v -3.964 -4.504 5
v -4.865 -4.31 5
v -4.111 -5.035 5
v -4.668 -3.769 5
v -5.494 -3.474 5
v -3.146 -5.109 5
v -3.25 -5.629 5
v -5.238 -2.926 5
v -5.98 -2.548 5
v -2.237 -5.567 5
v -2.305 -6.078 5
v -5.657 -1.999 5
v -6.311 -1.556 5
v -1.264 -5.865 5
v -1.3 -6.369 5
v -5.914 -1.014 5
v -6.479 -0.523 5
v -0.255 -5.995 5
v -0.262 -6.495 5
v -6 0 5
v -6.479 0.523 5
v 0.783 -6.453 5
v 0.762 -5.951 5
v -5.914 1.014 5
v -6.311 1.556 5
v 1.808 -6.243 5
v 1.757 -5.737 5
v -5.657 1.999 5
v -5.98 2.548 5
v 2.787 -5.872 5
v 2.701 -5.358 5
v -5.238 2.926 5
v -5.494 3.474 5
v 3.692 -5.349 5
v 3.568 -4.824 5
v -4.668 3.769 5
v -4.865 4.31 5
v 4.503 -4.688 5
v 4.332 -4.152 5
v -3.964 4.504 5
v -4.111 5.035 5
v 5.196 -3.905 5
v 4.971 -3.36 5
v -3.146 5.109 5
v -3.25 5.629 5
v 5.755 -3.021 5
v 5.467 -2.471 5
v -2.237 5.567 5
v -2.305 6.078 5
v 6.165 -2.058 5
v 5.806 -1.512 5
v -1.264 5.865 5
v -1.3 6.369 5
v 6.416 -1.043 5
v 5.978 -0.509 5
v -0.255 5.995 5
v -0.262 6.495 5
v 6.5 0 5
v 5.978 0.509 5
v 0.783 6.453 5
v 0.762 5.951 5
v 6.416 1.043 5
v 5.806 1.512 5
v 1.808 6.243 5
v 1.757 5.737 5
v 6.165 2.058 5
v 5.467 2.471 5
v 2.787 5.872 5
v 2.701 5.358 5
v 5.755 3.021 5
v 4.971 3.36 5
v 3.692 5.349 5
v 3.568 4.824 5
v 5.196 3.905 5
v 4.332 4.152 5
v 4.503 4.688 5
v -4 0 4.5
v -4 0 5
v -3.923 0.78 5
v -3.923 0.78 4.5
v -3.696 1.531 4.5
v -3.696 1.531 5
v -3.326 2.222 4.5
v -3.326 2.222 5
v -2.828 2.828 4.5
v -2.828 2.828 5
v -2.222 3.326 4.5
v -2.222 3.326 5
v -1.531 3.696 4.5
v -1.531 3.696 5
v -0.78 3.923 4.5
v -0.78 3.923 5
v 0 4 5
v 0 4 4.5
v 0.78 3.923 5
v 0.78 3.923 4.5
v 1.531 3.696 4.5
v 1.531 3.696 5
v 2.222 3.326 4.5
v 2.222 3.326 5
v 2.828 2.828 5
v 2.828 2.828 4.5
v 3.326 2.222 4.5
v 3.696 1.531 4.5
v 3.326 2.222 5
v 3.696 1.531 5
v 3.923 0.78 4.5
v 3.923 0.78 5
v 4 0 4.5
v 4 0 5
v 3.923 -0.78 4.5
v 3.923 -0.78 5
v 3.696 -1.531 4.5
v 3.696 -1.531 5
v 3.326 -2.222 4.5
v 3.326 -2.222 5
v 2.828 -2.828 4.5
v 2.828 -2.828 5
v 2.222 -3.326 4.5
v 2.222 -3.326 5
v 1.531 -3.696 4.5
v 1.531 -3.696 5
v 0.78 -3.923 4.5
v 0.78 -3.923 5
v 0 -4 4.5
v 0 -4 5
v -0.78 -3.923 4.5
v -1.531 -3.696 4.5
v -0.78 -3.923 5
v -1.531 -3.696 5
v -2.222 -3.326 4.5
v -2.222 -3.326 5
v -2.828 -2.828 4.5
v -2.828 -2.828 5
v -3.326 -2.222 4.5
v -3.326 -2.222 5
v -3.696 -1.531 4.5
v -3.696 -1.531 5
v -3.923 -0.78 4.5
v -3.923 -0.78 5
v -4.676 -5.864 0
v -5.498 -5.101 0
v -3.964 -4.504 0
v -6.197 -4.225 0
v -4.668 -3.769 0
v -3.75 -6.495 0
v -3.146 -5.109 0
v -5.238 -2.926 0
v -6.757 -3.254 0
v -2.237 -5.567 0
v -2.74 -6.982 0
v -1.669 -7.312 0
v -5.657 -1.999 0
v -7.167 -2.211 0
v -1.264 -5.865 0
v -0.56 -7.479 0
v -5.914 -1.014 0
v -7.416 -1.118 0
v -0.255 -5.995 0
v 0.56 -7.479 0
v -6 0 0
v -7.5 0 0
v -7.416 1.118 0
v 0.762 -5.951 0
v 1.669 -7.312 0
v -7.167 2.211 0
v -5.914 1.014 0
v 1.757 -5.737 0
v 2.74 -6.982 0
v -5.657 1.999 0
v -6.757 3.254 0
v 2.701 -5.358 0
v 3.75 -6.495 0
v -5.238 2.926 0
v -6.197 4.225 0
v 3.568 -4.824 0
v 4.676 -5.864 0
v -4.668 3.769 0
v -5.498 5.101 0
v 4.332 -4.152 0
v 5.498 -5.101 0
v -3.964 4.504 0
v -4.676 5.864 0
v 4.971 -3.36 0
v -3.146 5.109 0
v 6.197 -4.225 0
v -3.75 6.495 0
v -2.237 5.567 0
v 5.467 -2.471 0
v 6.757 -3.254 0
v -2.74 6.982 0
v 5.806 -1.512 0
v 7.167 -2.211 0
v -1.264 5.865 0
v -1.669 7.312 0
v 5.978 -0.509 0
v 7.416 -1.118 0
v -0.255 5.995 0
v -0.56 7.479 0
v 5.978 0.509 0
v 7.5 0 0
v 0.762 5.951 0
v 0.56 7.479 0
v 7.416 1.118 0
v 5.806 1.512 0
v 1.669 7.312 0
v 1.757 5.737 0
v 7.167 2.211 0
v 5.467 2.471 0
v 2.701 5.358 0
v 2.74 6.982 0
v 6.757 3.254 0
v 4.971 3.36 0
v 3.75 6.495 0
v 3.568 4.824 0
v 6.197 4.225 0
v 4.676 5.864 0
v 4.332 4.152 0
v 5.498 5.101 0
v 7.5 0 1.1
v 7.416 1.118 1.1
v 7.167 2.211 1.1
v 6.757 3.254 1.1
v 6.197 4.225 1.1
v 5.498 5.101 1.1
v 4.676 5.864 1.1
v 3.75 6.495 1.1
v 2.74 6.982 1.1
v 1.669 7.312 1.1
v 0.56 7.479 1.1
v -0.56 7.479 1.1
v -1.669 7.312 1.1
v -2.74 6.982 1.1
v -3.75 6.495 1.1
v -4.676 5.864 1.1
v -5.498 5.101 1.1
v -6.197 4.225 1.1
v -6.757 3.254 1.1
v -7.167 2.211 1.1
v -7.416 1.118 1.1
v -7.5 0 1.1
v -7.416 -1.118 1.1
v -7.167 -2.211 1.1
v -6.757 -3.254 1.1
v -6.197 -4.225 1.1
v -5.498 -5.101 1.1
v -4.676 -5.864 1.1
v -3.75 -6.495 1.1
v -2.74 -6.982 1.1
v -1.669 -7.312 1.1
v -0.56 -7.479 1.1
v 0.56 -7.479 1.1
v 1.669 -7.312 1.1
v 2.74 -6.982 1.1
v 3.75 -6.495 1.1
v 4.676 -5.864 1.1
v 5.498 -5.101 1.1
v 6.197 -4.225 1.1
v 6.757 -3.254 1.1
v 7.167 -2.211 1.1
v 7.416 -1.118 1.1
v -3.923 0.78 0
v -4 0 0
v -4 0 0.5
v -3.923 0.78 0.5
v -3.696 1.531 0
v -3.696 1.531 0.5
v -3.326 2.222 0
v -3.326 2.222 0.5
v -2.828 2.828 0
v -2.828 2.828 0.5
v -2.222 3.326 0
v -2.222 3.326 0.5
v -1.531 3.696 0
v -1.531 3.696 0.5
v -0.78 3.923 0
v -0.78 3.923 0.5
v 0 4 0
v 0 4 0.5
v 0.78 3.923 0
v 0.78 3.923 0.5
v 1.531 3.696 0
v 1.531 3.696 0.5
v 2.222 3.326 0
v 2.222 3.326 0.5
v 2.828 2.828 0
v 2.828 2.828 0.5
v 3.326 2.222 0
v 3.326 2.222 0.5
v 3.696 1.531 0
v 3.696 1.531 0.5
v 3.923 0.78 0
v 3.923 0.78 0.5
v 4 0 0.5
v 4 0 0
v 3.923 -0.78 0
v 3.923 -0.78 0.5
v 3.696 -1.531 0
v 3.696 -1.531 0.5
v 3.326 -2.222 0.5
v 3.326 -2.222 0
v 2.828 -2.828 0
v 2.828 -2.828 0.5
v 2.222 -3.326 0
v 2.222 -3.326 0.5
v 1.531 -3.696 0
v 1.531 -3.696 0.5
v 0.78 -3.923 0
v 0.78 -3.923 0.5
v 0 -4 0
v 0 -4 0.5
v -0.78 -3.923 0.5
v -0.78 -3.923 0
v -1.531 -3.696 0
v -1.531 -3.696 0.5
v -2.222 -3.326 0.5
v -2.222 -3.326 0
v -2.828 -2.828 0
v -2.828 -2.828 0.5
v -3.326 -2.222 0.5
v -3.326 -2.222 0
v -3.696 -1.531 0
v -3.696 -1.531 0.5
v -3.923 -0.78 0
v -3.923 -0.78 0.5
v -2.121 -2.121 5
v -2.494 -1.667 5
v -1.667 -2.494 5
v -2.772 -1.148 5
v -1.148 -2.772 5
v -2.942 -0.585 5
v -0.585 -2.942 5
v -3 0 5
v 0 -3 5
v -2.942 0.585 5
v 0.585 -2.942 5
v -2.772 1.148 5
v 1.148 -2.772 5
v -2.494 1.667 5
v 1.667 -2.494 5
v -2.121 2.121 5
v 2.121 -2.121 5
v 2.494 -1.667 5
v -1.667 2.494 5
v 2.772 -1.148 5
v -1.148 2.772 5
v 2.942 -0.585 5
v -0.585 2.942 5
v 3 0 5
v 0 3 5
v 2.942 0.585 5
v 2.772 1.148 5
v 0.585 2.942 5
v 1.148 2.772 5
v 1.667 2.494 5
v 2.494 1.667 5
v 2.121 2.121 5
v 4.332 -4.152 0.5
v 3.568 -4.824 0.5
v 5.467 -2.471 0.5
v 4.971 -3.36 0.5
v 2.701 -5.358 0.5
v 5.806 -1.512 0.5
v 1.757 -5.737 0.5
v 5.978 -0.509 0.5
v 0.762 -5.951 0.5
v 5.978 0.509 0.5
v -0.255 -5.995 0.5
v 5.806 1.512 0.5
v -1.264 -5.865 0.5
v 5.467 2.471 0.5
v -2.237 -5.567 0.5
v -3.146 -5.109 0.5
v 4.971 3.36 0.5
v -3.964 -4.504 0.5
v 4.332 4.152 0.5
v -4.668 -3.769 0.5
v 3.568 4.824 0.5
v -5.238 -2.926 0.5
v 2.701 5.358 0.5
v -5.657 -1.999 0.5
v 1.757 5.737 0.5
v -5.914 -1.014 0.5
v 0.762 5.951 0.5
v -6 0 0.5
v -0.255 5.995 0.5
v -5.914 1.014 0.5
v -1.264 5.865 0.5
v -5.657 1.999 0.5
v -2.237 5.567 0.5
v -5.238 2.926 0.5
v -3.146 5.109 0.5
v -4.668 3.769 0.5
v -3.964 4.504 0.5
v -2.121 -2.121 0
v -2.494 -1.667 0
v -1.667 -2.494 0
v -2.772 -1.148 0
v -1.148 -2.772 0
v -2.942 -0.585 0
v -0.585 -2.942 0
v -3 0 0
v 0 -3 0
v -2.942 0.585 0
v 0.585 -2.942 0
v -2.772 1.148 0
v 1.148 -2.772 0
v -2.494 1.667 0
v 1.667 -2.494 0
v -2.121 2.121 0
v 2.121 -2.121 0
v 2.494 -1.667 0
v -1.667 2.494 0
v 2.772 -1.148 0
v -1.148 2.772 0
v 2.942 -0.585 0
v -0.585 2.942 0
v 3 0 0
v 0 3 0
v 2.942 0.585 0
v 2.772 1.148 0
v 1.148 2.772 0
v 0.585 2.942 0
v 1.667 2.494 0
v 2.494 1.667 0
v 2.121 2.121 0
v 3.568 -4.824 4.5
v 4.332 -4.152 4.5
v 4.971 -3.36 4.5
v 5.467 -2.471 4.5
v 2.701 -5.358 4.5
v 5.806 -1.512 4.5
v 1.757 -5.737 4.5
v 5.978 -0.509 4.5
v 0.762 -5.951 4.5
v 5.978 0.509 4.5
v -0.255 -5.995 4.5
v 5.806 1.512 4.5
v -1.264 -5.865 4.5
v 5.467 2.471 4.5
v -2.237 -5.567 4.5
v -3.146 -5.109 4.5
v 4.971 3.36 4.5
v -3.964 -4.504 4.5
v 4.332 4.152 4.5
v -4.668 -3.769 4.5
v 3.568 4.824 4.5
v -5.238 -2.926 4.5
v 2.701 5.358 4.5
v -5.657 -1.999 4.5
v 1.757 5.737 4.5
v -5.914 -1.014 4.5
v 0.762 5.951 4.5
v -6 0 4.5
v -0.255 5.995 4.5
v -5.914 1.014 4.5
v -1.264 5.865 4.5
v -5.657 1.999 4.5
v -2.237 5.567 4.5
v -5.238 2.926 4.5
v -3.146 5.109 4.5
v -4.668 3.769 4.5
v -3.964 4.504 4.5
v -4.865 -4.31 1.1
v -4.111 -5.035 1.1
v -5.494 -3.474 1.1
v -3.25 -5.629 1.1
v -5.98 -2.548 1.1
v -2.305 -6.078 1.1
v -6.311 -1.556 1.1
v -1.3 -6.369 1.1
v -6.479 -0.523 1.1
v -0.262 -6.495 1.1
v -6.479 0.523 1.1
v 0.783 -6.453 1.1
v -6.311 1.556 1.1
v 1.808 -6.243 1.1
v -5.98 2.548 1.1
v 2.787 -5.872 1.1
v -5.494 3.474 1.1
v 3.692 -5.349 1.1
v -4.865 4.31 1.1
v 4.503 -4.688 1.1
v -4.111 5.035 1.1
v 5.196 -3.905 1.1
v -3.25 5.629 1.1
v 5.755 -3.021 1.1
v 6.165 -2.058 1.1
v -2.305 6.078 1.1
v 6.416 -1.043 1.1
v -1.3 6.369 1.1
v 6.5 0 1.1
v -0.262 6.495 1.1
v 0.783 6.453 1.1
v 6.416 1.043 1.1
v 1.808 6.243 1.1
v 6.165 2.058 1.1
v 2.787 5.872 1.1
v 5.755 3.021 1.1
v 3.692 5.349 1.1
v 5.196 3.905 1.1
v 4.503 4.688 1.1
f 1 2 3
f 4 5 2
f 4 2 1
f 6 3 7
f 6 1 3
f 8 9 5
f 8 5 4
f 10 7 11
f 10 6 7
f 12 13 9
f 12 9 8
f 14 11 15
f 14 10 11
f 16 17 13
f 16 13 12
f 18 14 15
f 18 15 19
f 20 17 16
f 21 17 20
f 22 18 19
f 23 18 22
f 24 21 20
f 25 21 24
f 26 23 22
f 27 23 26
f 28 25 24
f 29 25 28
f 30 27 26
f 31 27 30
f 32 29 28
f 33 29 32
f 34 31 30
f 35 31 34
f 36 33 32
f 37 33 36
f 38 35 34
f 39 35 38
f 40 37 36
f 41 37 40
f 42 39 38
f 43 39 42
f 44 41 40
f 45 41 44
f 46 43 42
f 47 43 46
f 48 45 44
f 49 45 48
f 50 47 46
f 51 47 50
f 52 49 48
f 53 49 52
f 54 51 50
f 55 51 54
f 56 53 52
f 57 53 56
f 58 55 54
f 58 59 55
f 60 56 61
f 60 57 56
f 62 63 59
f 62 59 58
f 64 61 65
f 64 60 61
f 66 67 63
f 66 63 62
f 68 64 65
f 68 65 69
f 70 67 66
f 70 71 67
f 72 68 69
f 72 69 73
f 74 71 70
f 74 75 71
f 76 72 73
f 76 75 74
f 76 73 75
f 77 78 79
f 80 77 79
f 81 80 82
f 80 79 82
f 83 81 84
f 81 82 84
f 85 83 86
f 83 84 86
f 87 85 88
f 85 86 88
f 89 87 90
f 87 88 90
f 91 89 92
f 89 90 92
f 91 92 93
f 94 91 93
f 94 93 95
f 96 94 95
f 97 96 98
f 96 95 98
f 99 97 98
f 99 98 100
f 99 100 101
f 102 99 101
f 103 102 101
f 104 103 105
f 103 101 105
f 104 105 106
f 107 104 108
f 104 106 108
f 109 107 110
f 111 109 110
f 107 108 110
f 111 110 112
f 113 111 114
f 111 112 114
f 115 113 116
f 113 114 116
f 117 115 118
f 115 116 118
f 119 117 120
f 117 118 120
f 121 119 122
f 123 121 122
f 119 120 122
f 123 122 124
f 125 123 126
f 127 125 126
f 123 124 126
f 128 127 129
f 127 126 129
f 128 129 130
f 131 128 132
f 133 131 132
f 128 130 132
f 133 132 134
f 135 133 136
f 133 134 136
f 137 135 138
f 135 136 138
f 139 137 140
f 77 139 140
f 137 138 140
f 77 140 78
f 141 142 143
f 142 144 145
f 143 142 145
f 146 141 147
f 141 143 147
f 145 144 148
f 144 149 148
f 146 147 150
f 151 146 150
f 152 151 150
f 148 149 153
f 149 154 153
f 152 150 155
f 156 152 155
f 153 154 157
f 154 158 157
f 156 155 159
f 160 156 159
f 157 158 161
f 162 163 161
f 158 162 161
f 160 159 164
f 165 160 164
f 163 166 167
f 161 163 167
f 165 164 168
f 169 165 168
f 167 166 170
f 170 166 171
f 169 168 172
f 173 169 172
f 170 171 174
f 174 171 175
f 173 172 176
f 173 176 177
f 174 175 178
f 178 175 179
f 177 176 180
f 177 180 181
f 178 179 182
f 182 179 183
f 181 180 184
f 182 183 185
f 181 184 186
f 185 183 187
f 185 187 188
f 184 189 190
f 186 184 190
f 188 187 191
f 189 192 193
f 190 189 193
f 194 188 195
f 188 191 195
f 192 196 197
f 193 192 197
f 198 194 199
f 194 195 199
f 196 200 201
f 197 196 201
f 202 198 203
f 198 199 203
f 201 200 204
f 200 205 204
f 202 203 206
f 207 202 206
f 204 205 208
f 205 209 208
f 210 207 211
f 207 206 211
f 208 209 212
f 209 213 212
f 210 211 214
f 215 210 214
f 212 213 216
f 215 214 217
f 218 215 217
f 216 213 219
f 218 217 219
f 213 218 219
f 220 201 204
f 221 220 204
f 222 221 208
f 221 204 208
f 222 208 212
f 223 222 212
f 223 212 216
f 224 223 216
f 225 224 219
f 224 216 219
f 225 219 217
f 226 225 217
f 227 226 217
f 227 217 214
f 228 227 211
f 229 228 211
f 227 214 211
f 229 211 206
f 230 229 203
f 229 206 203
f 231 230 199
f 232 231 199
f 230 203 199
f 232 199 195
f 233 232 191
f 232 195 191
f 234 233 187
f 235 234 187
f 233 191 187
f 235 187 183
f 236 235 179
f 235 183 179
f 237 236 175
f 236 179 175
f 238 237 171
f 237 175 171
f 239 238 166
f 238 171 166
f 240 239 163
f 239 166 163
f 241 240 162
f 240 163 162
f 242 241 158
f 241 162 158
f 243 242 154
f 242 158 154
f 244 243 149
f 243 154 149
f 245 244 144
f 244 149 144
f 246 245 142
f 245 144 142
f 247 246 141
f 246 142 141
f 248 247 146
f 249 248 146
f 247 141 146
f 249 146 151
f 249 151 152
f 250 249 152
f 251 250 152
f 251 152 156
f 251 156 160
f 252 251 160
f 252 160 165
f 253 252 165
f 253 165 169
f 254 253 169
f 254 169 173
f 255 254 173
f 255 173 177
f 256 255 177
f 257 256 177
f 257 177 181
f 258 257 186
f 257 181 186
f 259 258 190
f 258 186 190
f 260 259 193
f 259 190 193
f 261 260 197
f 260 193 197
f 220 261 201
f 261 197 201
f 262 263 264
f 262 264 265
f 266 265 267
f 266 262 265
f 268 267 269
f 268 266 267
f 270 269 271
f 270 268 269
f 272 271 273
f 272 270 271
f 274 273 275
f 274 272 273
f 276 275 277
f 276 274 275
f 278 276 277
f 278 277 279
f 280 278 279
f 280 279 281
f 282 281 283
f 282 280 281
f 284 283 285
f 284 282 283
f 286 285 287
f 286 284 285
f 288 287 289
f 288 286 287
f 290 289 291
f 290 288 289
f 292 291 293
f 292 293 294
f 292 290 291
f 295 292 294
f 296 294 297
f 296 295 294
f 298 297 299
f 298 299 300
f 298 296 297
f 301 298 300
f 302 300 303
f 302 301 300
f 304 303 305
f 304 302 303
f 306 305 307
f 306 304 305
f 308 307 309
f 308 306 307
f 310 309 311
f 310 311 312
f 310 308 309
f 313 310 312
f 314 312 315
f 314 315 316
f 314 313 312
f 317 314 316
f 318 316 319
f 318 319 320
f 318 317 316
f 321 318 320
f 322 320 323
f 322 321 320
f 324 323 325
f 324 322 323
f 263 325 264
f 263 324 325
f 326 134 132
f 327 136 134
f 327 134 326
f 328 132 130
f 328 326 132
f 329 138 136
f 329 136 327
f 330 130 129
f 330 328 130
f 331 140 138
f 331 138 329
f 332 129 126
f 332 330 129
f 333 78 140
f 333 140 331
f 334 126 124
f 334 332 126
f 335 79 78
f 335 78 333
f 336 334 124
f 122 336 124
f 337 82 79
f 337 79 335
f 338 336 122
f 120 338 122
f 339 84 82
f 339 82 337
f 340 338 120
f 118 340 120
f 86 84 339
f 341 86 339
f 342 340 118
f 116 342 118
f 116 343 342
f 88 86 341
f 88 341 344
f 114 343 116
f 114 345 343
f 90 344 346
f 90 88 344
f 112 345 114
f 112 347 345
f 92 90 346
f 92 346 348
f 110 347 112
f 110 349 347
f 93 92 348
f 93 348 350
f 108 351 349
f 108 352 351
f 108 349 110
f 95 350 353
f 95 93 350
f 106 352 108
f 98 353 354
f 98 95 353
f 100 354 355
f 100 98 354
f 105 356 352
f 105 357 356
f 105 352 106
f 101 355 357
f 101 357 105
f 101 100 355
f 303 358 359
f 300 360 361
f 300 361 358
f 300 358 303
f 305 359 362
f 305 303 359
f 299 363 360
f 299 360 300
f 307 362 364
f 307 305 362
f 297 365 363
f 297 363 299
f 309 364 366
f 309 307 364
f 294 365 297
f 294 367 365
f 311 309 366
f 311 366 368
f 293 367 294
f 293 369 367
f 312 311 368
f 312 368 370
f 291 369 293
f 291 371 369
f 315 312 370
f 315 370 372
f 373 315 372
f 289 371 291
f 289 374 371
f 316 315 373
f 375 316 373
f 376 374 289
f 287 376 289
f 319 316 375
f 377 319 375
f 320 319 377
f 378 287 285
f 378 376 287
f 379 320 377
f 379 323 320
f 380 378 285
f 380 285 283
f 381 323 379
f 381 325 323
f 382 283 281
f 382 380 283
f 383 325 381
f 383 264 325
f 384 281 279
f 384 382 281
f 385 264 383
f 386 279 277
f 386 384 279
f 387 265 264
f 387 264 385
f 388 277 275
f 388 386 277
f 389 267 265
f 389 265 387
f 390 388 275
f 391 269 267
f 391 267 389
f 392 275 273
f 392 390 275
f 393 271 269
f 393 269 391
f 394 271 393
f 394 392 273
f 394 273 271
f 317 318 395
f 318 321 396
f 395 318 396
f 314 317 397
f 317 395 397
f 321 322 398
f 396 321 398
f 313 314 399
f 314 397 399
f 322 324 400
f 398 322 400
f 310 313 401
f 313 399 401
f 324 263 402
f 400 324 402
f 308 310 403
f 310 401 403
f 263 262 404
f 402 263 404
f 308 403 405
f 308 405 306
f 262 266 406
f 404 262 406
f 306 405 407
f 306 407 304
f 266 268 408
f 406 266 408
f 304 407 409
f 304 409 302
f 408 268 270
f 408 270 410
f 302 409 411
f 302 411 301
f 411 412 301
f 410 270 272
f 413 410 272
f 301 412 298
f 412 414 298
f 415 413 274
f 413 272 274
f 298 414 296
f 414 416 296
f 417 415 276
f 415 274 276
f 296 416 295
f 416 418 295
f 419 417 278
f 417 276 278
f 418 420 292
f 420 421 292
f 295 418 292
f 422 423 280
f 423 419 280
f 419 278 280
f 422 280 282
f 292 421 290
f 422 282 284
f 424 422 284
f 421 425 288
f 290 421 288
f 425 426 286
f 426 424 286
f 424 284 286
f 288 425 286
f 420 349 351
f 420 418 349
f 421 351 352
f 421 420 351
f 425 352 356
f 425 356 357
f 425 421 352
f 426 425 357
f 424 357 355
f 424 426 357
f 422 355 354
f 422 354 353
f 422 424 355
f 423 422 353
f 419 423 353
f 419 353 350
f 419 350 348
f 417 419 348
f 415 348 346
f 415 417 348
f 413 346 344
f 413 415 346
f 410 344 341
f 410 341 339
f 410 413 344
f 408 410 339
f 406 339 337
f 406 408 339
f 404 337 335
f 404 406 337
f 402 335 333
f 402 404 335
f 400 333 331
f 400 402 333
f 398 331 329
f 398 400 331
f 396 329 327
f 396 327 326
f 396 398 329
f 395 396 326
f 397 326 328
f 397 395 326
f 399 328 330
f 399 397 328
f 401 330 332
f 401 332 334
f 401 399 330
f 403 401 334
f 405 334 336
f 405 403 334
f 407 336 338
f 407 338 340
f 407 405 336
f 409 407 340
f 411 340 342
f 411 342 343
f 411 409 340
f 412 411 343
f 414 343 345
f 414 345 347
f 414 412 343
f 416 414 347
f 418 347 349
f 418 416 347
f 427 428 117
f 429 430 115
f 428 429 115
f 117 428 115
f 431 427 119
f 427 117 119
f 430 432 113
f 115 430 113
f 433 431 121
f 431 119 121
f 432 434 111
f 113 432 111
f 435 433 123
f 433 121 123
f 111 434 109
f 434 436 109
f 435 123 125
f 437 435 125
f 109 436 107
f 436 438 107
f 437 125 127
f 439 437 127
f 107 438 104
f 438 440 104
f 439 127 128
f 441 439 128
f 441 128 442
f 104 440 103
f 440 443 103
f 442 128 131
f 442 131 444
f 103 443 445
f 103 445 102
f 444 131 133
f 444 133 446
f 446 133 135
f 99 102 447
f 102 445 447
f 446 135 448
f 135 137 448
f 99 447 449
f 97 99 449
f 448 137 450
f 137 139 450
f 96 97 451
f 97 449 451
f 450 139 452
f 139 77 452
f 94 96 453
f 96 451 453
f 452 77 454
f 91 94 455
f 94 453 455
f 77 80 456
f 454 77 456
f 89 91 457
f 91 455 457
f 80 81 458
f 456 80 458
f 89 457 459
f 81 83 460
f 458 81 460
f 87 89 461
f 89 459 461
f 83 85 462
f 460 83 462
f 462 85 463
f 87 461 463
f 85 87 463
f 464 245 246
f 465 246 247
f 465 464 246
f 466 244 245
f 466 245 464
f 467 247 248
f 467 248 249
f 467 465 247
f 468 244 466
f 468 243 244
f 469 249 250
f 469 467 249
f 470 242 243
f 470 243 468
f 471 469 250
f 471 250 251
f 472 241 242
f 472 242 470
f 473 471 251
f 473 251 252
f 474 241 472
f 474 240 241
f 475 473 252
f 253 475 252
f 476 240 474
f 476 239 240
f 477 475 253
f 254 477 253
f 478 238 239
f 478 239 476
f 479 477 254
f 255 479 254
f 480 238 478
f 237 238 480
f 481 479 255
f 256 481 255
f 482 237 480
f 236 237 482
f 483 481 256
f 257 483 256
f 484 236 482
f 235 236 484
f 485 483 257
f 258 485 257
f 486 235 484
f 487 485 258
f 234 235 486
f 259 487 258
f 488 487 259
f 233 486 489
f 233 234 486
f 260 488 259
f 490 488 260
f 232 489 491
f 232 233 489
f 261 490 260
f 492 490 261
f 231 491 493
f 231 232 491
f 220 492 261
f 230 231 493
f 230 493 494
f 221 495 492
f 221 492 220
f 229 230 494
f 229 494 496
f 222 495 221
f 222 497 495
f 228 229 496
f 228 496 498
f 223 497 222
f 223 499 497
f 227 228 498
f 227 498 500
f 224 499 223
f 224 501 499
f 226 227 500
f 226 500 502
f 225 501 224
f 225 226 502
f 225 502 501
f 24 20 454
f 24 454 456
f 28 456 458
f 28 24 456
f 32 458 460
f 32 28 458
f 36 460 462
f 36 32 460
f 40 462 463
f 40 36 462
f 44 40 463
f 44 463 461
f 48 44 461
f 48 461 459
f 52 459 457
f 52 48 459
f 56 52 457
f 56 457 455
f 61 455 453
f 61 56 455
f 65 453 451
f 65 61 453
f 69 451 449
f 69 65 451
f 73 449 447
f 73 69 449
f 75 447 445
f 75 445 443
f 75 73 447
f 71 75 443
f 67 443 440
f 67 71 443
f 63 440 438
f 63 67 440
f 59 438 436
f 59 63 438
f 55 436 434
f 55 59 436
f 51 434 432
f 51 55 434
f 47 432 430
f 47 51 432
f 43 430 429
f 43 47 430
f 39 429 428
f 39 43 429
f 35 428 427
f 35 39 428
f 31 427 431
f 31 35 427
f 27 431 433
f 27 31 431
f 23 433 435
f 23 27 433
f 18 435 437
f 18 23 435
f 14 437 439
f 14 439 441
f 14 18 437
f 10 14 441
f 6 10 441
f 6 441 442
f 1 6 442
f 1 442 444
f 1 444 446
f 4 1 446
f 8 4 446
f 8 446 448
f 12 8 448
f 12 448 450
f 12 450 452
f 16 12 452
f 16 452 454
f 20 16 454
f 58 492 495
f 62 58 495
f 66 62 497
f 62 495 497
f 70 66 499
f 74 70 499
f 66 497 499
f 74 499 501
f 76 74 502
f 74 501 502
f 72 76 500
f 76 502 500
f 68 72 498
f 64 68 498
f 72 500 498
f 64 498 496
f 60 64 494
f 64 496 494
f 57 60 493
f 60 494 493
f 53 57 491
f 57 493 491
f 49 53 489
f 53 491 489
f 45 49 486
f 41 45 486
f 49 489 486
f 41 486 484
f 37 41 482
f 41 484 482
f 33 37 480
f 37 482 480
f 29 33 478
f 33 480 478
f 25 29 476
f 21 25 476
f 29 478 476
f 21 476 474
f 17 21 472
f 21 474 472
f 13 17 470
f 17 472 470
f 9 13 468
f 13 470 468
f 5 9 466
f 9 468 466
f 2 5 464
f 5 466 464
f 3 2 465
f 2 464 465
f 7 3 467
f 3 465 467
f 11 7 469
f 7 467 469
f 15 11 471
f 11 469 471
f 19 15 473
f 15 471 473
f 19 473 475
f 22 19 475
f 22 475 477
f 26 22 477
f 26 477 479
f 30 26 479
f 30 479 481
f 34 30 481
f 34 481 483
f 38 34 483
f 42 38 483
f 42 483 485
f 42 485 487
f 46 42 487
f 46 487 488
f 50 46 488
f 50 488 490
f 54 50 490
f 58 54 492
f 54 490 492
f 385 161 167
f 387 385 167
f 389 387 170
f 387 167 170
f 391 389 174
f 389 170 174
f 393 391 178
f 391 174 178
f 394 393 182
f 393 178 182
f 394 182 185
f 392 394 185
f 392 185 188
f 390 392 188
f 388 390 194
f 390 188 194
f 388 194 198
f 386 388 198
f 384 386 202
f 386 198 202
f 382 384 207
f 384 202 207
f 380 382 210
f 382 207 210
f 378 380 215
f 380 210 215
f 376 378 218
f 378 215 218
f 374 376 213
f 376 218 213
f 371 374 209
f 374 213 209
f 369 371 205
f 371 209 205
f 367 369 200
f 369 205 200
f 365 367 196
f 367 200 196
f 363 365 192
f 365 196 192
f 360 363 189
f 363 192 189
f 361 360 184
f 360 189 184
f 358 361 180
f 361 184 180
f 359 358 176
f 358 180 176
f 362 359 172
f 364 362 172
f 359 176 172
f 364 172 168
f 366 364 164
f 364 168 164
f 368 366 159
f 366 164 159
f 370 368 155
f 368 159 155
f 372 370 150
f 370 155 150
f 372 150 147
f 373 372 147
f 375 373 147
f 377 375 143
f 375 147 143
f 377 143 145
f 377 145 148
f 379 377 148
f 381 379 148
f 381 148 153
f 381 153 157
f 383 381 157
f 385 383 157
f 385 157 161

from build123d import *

# Parameters (mm, degrees)
SKETCH1_R           = 7.5
SKETCH1_R_2         = 3
BOSS_EXTRUDE1_DEPTH = 1.1
SKETCH2_R           = 6.5
SKETCH2_R_2         = 3
BOSS_EXTRUDE2_DEPTH = 3.9
SKETCH3_R           = 6
SKETCH3_R_2         = 4
CUT_EXTRUDE1_DEPTH  = 0.5


with BuildPart() as part:
    # Sketch1 → Boss-Extrude1 (new body)
    with BuildSketch(Plane.XY):
        Circle(SKETCH1_R)
        Circle(SKETCH1_R_2, mode=Mode.SUBTRACT)
    extrude(amount=BOSS_EXTRUDE1_DEPTH)

    # Sketch2 → Boss-Extrude2 (add)
    with BuildSketch(Plane.XY.offset(1.1)):
        Circle(SKETCH2_R)
        Circle(SKETCH2_R_2, mode=Mode.SUBTRACT)
    extrude(amount=BOSS_EXTRUDE2_DEPTH)

    # Sketch3 → Cut-Extrude1 (cut)
    with BuildSketch(Plane(origin=(0, 0, 0), x_dir=(-1, 0, 0), z_dir=(0, 0, -1))):
        Circle(SKETCH3_R)
        Circle(SKETCH3_R_2, mode=Mode.SUBTRACT)
    cut_extrude1 = extrude(amount=-CUT_EXTRUDE1_DEPTH, mode=Mode.SUBTRACT)

    # Mirror1: Cut-Extrude1 across plane
    add(cut_extrude1.mirror(Plane.XY.offset(2.5)), mode=Mode.SUBTRACT)


solid = part.part
